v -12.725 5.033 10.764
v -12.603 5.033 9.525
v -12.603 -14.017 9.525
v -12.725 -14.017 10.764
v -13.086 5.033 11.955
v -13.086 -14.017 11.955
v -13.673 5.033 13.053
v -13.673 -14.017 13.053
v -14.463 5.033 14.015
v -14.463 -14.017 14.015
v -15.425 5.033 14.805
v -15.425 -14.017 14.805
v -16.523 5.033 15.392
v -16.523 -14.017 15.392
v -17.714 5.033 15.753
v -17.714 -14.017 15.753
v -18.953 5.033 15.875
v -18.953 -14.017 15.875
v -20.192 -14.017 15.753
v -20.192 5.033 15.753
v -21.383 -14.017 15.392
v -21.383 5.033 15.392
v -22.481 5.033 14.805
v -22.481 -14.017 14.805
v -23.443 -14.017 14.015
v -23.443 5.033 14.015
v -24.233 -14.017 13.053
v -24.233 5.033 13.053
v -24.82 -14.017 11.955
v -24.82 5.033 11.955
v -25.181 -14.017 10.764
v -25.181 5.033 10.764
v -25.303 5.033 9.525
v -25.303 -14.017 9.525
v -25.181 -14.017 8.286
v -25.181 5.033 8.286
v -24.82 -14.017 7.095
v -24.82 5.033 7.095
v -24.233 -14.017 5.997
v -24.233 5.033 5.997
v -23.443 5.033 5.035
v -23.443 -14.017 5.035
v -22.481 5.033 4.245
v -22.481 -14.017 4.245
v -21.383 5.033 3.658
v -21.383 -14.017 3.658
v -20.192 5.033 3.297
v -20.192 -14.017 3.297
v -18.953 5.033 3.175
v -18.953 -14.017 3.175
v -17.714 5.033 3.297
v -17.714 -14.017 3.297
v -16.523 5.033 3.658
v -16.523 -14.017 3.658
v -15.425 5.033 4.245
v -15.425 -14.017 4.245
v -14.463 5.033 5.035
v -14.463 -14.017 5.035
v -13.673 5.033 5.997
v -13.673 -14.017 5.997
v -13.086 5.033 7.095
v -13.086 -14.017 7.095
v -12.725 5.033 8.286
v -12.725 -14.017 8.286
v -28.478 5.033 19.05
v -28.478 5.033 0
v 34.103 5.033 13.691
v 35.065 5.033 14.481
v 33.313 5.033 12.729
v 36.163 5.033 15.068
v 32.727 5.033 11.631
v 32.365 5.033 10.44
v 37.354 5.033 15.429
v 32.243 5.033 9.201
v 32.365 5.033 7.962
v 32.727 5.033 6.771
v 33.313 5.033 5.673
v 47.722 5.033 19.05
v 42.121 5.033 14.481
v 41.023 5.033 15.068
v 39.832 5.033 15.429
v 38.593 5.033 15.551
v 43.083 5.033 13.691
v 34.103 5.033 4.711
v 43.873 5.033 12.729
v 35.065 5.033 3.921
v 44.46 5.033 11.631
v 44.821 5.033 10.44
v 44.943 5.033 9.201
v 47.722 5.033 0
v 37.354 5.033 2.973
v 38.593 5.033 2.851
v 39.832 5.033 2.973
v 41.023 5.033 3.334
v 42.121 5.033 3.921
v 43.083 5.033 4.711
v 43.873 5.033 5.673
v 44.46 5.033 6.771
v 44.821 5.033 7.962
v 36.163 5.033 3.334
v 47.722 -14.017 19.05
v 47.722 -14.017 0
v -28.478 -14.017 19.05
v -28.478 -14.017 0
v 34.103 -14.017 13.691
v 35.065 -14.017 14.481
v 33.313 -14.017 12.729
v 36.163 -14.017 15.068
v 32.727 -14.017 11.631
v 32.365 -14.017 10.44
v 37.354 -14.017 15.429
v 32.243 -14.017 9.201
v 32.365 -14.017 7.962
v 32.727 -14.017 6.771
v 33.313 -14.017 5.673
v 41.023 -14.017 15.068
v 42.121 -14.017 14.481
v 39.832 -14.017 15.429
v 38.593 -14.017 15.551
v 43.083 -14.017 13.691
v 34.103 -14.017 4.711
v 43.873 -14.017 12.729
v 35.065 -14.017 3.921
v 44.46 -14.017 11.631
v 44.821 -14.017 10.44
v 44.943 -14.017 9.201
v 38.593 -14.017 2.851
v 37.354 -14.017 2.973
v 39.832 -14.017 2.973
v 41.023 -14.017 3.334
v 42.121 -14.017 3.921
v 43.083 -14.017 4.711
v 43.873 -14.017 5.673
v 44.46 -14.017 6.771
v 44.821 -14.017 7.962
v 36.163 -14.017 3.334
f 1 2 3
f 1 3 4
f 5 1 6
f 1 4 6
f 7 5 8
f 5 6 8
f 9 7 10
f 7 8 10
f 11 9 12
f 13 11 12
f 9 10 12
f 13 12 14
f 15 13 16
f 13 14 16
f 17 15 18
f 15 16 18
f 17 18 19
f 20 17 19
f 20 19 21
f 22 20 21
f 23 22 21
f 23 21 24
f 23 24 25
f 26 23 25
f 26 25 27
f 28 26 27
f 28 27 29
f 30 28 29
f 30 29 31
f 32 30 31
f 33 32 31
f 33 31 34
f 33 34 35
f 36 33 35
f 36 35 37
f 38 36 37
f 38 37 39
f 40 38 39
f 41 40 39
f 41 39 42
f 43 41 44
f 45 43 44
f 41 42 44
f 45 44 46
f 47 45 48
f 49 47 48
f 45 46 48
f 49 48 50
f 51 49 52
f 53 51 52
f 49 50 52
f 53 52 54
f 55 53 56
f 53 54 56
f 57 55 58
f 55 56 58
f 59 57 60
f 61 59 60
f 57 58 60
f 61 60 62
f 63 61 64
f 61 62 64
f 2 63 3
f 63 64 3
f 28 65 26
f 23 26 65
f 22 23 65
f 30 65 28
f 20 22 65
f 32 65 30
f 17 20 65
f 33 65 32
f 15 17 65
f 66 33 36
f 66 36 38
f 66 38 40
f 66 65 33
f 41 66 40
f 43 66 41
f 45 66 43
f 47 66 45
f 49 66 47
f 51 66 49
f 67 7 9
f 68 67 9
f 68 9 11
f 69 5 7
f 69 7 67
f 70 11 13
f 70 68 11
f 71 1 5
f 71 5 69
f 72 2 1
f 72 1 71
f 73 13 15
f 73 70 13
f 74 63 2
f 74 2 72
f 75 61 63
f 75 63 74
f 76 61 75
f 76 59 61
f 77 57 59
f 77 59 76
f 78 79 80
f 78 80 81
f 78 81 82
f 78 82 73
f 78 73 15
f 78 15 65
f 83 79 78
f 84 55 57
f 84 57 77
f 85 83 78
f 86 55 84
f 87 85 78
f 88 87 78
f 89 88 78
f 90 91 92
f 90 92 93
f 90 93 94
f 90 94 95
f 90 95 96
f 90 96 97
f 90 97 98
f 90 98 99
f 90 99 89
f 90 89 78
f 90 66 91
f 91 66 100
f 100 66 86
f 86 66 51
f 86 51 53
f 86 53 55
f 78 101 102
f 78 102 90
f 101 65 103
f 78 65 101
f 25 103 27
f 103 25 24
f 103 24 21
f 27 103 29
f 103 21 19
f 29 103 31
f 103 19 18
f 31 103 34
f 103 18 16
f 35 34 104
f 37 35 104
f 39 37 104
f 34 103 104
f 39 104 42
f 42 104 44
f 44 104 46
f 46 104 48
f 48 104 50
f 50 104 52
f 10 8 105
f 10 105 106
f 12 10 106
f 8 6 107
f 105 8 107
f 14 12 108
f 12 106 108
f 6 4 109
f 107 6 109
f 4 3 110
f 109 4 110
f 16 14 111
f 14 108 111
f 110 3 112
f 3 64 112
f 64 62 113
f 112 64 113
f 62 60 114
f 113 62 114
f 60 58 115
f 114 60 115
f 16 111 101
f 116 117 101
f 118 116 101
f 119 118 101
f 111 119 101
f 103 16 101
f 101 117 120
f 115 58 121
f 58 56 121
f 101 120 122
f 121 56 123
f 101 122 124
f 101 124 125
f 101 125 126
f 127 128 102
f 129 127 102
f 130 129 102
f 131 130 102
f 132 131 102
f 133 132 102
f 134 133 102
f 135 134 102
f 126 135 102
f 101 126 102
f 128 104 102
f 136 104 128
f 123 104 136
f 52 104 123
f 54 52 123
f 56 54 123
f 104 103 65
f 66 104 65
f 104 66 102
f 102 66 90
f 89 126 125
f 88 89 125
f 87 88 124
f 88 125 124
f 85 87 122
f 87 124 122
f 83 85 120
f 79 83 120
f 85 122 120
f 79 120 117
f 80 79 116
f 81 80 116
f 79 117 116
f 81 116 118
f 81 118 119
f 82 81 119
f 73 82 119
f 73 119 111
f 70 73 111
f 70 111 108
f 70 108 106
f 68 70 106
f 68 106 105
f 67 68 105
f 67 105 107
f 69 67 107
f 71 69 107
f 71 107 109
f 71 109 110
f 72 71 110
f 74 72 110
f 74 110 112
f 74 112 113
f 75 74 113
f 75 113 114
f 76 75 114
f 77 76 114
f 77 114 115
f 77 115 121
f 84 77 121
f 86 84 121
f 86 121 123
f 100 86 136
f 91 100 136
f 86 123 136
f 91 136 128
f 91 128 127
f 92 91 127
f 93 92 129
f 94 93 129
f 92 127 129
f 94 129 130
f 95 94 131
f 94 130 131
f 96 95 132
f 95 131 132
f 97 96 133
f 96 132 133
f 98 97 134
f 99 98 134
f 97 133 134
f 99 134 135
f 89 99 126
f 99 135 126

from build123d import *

# Parameters (mm, degrees)
F0_W     = 76.2
F0_H     = 19.05
F1_DEPTH = 19.05
F3_D     = 12.7
F4_R     = 6.35
F5_DEPTH = 51.054


with BuildPart() as f1:
    # F0 (on Top) → F1 (new body)
    with BuildSketch(Plane.XY):
        with Locations((9.621889, -4.491718)):
            Rectangle(F0_W, F0_H)
    extrude(amount=F1_DEPTH)

    # F3 (through all)
    with Locations(Plane(origin=(0, 5.033282, 0), x_dir=(-1, 0, 0), z_dir=(0, 1, 0))):
        with Locations((18.953111, 9.525)):
            Hole(F3_D / 2)

    # F4 (on face) → F5 (cut)
    with BuildSketch(Plane.XZ.offset(14.016718)):
        with Locations((38.593322, 9.200889)):
            Circle(F4_R)
    extrude(amount=-F5_DEPTH, mode=Mode.SUBTRACT)


solid = f1.part
